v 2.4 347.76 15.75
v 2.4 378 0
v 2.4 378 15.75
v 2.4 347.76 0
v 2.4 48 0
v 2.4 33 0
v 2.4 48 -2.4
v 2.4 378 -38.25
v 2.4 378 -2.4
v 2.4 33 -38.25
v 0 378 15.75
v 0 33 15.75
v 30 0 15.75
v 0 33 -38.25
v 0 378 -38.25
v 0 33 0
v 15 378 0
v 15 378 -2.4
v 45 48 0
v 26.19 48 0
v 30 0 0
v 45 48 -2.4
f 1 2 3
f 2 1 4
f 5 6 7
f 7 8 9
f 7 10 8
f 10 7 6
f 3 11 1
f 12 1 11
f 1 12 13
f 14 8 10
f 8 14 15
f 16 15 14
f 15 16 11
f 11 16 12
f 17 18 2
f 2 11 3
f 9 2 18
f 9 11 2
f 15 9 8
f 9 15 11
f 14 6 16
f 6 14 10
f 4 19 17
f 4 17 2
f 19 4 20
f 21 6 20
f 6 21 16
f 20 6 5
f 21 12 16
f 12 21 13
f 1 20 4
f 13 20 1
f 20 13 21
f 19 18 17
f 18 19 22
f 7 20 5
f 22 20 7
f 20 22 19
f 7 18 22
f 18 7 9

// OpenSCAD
a1=345;
a2=378;
ad=a2-a1;
b=30;
h=15.75; //Hoehe Regalbrett
t=2.4;
kb=25+2;
hk=kb*2;
af=15;//Auflagefläche

color("green")
translate([0,a2-a1,-hk+h])
cube([t,a1,hk]);

linear_extrude(h)
polygon([[0,a2-a1],[0,a2],[b,0]]);

color("blue")
translate([0,0,-t])
linear_extrude(t)
polygon([[0,ad+af],[0,a2],[af,a2],[b+af,ad+af]]);
